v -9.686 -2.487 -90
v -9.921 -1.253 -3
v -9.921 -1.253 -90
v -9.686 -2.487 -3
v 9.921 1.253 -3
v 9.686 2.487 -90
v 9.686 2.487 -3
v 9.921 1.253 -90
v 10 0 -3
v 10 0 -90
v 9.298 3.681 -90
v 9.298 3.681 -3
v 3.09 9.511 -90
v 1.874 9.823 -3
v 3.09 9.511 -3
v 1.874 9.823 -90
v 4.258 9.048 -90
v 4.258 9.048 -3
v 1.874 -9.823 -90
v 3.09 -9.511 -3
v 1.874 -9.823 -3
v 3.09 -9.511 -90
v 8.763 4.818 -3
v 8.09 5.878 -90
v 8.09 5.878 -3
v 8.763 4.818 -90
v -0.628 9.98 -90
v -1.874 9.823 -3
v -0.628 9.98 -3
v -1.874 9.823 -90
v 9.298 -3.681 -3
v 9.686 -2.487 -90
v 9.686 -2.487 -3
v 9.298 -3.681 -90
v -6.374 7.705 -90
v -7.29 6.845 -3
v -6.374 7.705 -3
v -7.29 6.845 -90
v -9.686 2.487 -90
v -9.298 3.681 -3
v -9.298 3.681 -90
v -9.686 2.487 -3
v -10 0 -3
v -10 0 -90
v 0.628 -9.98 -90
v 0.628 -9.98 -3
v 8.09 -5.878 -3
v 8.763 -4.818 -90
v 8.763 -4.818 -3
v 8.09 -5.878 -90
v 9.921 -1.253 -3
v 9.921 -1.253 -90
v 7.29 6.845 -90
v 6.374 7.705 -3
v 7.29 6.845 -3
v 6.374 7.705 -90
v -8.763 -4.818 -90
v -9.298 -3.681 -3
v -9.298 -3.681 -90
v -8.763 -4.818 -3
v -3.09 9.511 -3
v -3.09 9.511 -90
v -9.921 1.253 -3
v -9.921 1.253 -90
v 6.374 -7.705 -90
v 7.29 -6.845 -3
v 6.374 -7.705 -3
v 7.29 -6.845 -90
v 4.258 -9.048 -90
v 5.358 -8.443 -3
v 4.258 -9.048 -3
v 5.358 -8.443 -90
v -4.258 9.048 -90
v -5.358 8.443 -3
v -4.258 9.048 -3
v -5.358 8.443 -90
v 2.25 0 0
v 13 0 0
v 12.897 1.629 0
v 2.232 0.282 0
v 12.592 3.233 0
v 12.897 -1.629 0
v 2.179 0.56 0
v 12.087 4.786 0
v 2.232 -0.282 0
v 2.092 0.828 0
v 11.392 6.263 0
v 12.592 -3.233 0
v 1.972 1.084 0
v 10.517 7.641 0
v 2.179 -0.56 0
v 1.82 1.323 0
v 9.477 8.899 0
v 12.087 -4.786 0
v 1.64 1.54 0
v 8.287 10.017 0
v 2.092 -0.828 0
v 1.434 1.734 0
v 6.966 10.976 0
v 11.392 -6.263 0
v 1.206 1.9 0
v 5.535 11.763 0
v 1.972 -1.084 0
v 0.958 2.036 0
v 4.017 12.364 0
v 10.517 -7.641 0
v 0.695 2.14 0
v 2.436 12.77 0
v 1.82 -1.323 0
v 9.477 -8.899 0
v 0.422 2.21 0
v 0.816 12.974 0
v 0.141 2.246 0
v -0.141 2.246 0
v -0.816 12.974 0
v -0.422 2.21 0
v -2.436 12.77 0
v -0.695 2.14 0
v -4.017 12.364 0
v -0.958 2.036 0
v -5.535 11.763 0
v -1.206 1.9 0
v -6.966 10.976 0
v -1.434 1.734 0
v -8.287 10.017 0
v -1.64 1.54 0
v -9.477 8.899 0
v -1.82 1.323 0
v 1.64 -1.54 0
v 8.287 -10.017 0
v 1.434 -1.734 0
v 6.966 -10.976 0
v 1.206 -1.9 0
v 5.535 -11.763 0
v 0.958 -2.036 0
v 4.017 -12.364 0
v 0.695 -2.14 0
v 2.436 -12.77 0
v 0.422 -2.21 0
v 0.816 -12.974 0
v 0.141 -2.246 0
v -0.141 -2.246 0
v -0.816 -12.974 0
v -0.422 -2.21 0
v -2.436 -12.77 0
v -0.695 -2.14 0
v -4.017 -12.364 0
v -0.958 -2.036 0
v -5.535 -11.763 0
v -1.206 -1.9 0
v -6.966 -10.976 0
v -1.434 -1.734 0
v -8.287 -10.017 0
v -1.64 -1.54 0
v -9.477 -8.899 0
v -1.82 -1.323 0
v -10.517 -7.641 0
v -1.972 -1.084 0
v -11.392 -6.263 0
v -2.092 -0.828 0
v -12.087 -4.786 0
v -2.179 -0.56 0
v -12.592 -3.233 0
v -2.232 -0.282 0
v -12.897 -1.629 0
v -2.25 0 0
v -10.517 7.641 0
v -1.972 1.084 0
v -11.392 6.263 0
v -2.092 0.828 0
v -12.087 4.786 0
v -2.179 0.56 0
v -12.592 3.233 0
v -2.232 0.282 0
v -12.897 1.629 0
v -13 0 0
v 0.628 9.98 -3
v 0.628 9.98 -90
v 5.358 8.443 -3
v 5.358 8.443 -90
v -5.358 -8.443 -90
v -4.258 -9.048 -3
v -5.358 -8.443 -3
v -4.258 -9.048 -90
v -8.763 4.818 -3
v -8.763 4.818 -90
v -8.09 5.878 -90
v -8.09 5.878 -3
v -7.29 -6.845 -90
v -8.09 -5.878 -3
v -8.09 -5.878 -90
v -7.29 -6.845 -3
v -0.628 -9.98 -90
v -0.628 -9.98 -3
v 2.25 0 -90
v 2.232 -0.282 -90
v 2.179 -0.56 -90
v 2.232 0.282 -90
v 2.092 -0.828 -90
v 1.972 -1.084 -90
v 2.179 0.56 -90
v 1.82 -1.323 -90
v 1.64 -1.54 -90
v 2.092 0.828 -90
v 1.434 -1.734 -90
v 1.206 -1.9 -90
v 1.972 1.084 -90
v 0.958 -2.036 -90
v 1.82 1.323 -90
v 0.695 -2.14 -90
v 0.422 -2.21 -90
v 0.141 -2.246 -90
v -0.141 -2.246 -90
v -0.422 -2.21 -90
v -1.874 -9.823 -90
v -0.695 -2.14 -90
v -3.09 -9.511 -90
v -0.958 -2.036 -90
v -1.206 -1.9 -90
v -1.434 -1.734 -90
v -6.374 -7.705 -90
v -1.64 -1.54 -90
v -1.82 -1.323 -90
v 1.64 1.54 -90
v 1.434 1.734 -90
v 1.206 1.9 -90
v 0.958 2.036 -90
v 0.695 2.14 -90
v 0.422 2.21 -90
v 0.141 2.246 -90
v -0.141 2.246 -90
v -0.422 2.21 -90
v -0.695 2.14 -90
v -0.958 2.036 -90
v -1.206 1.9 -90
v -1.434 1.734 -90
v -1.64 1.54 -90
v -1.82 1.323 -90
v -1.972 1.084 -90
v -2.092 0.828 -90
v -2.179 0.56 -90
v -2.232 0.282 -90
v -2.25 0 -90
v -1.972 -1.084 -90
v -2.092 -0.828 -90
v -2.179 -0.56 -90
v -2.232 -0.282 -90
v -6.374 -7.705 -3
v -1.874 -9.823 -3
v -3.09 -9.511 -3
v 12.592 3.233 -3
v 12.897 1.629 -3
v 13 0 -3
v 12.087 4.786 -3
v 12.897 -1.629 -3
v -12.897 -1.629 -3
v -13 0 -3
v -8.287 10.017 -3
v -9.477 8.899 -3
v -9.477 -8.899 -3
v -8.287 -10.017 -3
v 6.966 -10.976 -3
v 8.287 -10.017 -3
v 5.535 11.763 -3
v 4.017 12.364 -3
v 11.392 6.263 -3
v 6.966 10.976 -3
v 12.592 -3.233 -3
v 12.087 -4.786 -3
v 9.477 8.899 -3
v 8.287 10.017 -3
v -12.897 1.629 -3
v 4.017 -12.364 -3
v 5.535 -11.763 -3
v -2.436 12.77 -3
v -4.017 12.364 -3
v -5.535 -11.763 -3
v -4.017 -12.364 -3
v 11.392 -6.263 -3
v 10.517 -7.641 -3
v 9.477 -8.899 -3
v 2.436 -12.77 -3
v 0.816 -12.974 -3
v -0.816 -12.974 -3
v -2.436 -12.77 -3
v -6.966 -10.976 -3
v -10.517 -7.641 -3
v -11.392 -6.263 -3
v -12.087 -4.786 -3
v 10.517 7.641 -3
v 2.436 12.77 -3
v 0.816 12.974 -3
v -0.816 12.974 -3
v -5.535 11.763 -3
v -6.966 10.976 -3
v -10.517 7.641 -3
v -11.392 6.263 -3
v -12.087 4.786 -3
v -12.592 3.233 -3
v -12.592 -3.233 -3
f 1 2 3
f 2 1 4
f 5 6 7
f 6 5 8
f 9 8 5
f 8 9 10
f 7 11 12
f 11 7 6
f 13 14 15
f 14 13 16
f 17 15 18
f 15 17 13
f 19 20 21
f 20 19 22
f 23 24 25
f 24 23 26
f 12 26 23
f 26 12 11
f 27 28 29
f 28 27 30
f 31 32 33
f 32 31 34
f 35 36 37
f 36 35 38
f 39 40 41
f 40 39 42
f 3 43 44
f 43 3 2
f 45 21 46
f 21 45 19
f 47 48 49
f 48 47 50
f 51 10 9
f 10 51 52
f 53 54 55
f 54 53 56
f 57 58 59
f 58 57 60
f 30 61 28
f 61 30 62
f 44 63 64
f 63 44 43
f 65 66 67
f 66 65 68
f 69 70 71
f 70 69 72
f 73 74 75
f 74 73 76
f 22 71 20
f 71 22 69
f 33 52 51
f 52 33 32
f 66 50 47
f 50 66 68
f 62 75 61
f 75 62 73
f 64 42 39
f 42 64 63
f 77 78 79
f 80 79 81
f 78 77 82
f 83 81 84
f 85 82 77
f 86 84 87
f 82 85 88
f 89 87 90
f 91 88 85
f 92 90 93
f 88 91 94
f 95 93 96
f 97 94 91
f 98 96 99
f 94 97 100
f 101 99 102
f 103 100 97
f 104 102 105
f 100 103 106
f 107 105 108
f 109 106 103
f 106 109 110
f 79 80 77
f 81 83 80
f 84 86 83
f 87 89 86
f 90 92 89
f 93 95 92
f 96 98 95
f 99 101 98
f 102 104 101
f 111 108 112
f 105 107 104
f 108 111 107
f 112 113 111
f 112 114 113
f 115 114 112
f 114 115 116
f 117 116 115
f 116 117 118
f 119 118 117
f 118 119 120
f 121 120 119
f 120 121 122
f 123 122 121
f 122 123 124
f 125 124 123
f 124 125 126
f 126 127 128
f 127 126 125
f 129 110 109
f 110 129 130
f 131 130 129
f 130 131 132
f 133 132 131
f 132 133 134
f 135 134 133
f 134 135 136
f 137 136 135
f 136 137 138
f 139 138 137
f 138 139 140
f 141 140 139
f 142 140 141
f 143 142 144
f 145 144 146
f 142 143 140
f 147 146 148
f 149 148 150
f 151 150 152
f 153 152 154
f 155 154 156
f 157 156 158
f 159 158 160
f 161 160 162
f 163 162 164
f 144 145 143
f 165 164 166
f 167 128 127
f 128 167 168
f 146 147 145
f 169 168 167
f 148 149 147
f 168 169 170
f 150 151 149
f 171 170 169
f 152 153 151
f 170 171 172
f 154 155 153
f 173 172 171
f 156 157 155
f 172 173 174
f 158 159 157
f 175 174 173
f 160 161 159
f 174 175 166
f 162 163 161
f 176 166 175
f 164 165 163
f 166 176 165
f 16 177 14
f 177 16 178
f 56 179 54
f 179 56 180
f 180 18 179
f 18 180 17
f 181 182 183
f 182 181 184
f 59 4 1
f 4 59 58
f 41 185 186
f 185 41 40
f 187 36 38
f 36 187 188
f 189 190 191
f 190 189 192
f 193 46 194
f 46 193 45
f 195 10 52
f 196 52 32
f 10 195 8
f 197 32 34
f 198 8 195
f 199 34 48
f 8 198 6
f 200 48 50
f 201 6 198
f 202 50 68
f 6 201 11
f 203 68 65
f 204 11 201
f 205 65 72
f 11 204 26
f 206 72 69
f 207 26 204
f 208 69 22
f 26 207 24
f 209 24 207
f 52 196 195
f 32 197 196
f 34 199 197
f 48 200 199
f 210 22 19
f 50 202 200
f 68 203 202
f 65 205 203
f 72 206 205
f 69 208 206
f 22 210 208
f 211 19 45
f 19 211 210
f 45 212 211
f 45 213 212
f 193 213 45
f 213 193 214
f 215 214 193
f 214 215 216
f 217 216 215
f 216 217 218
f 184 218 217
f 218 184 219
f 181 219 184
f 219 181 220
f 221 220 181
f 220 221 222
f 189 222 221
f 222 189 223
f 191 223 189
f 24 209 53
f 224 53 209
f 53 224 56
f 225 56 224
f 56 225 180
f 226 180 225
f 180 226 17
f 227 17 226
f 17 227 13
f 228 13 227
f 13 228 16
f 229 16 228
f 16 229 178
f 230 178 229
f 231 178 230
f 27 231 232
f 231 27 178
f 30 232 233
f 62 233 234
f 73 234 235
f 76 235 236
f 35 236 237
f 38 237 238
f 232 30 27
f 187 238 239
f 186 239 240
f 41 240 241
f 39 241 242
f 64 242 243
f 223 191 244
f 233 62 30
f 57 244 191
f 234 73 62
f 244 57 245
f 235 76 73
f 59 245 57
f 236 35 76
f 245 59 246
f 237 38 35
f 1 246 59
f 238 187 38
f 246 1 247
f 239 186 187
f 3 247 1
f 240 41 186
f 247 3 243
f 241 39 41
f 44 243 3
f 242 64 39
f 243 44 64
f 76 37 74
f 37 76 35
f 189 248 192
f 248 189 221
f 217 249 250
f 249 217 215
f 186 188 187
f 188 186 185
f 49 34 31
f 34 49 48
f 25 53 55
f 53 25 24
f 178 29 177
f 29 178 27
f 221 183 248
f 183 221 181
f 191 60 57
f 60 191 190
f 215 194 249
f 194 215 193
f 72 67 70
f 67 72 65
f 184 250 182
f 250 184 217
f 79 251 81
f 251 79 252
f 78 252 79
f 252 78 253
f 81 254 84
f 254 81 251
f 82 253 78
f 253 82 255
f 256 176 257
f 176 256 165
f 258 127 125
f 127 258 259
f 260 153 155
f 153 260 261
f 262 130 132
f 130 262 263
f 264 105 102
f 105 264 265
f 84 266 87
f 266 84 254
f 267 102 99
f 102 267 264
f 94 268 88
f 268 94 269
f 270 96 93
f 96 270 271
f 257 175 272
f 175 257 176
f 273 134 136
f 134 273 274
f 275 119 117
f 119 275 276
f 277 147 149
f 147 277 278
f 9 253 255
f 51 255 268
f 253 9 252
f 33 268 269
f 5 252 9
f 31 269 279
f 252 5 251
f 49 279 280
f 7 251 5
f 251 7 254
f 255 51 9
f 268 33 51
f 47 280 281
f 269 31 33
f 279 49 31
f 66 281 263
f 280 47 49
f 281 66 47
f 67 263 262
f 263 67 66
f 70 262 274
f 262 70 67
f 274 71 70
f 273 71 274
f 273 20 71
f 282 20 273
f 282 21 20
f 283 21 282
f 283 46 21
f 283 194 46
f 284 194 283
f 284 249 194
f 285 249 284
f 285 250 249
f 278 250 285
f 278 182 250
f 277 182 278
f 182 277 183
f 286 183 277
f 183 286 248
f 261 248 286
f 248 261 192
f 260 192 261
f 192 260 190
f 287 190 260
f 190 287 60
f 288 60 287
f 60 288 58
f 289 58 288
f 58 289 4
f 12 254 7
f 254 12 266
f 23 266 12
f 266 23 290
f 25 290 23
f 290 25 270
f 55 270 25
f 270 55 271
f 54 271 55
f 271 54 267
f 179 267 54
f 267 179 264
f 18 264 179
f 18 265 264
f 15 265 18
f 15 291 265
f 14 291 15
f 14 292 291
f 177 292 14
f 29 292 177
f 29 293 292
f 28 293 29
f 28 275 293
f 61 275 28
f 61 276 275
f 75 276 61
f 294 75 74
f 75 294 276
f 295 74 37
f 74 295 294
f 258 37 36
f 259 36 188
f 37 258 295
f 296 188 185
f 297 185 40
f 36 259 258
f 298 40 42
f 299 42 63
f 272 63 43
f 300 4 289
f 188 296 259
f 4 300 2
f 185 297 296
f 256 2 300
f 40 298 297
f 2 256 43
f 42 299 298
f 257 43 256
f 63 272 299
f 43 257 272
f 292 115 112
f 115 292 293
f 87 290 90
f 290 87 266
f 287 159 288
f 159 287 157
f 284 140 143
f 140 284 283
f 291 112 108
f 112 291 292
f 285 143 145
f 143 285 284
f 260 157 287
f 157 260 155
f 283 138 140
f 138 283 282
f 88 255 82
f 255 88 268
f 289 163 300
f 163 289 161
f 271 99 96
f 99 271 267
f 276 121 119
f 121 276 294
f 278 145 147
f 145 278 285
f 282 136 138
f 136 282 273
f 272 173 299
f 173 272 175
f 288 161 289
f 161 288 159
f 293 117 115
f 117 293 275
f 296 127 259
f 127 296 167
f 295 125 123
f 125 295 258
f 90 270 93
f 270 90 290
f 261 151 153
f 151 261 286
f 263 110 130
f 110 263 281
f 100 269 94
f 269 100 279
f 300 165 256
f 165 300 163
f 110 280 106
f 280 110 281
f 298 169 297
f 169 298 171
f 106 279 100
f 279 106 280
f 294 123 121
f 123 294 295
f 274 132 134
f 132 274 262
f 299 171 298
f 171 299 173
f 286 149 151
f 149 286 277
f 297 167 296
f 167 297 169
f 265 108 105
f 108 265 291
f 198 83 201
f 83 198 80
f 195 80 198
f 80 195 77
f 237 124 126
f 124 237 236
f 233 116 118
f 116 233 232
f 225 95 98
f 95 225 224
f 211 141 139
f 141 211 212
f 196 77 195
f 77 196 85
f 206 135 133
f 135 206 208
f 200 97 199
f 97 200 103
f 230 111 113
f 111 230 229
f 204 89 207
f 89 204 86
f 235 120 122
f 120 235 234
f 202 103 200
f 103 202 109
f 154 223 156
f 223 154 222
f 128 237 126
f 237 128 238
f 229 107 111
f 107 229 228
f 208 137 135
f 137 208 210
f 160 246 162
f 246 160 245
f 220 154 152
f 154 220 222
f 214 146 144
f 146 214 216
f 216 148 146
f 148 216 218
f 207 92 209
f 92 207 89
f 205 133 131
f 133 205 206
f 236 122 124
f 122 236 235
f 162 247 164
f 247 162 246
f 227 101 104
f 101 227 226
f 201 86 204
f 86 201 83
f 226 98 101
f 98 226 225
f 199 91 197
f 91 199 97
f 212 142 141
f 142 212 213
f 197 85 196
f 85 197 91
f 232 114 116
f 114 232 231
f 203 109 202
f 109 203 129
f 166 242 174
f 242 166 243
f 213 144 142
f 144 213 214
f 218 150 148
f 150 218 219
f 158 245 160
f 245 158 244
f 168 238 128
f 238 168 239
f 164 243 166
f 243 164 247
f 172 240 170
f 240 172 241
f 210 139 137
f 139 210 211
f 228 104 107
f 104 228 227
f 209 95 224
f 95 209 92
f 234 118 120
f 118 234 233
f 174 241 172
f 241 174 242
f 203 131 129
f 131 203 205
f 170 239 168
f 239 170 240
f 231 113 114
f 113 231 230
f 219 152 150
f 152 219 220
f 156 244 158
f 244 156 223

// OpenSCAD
$fn = 50;


difference() {
	union() {
		translate(v = [0, 0, -90.0000000000]) {
			cylinder(h = 90, r = 10.0000000000);
		}
		translate(v = [0, 0, -3.0000000000]) {
			cylinder(h = 3, r = 13.0000000000);
		}
	}
	union() {
		#translate(v = [0, 0, -90]) {
			cylinder(h = 90, r = 2.2500000000);
		}
	}
}
